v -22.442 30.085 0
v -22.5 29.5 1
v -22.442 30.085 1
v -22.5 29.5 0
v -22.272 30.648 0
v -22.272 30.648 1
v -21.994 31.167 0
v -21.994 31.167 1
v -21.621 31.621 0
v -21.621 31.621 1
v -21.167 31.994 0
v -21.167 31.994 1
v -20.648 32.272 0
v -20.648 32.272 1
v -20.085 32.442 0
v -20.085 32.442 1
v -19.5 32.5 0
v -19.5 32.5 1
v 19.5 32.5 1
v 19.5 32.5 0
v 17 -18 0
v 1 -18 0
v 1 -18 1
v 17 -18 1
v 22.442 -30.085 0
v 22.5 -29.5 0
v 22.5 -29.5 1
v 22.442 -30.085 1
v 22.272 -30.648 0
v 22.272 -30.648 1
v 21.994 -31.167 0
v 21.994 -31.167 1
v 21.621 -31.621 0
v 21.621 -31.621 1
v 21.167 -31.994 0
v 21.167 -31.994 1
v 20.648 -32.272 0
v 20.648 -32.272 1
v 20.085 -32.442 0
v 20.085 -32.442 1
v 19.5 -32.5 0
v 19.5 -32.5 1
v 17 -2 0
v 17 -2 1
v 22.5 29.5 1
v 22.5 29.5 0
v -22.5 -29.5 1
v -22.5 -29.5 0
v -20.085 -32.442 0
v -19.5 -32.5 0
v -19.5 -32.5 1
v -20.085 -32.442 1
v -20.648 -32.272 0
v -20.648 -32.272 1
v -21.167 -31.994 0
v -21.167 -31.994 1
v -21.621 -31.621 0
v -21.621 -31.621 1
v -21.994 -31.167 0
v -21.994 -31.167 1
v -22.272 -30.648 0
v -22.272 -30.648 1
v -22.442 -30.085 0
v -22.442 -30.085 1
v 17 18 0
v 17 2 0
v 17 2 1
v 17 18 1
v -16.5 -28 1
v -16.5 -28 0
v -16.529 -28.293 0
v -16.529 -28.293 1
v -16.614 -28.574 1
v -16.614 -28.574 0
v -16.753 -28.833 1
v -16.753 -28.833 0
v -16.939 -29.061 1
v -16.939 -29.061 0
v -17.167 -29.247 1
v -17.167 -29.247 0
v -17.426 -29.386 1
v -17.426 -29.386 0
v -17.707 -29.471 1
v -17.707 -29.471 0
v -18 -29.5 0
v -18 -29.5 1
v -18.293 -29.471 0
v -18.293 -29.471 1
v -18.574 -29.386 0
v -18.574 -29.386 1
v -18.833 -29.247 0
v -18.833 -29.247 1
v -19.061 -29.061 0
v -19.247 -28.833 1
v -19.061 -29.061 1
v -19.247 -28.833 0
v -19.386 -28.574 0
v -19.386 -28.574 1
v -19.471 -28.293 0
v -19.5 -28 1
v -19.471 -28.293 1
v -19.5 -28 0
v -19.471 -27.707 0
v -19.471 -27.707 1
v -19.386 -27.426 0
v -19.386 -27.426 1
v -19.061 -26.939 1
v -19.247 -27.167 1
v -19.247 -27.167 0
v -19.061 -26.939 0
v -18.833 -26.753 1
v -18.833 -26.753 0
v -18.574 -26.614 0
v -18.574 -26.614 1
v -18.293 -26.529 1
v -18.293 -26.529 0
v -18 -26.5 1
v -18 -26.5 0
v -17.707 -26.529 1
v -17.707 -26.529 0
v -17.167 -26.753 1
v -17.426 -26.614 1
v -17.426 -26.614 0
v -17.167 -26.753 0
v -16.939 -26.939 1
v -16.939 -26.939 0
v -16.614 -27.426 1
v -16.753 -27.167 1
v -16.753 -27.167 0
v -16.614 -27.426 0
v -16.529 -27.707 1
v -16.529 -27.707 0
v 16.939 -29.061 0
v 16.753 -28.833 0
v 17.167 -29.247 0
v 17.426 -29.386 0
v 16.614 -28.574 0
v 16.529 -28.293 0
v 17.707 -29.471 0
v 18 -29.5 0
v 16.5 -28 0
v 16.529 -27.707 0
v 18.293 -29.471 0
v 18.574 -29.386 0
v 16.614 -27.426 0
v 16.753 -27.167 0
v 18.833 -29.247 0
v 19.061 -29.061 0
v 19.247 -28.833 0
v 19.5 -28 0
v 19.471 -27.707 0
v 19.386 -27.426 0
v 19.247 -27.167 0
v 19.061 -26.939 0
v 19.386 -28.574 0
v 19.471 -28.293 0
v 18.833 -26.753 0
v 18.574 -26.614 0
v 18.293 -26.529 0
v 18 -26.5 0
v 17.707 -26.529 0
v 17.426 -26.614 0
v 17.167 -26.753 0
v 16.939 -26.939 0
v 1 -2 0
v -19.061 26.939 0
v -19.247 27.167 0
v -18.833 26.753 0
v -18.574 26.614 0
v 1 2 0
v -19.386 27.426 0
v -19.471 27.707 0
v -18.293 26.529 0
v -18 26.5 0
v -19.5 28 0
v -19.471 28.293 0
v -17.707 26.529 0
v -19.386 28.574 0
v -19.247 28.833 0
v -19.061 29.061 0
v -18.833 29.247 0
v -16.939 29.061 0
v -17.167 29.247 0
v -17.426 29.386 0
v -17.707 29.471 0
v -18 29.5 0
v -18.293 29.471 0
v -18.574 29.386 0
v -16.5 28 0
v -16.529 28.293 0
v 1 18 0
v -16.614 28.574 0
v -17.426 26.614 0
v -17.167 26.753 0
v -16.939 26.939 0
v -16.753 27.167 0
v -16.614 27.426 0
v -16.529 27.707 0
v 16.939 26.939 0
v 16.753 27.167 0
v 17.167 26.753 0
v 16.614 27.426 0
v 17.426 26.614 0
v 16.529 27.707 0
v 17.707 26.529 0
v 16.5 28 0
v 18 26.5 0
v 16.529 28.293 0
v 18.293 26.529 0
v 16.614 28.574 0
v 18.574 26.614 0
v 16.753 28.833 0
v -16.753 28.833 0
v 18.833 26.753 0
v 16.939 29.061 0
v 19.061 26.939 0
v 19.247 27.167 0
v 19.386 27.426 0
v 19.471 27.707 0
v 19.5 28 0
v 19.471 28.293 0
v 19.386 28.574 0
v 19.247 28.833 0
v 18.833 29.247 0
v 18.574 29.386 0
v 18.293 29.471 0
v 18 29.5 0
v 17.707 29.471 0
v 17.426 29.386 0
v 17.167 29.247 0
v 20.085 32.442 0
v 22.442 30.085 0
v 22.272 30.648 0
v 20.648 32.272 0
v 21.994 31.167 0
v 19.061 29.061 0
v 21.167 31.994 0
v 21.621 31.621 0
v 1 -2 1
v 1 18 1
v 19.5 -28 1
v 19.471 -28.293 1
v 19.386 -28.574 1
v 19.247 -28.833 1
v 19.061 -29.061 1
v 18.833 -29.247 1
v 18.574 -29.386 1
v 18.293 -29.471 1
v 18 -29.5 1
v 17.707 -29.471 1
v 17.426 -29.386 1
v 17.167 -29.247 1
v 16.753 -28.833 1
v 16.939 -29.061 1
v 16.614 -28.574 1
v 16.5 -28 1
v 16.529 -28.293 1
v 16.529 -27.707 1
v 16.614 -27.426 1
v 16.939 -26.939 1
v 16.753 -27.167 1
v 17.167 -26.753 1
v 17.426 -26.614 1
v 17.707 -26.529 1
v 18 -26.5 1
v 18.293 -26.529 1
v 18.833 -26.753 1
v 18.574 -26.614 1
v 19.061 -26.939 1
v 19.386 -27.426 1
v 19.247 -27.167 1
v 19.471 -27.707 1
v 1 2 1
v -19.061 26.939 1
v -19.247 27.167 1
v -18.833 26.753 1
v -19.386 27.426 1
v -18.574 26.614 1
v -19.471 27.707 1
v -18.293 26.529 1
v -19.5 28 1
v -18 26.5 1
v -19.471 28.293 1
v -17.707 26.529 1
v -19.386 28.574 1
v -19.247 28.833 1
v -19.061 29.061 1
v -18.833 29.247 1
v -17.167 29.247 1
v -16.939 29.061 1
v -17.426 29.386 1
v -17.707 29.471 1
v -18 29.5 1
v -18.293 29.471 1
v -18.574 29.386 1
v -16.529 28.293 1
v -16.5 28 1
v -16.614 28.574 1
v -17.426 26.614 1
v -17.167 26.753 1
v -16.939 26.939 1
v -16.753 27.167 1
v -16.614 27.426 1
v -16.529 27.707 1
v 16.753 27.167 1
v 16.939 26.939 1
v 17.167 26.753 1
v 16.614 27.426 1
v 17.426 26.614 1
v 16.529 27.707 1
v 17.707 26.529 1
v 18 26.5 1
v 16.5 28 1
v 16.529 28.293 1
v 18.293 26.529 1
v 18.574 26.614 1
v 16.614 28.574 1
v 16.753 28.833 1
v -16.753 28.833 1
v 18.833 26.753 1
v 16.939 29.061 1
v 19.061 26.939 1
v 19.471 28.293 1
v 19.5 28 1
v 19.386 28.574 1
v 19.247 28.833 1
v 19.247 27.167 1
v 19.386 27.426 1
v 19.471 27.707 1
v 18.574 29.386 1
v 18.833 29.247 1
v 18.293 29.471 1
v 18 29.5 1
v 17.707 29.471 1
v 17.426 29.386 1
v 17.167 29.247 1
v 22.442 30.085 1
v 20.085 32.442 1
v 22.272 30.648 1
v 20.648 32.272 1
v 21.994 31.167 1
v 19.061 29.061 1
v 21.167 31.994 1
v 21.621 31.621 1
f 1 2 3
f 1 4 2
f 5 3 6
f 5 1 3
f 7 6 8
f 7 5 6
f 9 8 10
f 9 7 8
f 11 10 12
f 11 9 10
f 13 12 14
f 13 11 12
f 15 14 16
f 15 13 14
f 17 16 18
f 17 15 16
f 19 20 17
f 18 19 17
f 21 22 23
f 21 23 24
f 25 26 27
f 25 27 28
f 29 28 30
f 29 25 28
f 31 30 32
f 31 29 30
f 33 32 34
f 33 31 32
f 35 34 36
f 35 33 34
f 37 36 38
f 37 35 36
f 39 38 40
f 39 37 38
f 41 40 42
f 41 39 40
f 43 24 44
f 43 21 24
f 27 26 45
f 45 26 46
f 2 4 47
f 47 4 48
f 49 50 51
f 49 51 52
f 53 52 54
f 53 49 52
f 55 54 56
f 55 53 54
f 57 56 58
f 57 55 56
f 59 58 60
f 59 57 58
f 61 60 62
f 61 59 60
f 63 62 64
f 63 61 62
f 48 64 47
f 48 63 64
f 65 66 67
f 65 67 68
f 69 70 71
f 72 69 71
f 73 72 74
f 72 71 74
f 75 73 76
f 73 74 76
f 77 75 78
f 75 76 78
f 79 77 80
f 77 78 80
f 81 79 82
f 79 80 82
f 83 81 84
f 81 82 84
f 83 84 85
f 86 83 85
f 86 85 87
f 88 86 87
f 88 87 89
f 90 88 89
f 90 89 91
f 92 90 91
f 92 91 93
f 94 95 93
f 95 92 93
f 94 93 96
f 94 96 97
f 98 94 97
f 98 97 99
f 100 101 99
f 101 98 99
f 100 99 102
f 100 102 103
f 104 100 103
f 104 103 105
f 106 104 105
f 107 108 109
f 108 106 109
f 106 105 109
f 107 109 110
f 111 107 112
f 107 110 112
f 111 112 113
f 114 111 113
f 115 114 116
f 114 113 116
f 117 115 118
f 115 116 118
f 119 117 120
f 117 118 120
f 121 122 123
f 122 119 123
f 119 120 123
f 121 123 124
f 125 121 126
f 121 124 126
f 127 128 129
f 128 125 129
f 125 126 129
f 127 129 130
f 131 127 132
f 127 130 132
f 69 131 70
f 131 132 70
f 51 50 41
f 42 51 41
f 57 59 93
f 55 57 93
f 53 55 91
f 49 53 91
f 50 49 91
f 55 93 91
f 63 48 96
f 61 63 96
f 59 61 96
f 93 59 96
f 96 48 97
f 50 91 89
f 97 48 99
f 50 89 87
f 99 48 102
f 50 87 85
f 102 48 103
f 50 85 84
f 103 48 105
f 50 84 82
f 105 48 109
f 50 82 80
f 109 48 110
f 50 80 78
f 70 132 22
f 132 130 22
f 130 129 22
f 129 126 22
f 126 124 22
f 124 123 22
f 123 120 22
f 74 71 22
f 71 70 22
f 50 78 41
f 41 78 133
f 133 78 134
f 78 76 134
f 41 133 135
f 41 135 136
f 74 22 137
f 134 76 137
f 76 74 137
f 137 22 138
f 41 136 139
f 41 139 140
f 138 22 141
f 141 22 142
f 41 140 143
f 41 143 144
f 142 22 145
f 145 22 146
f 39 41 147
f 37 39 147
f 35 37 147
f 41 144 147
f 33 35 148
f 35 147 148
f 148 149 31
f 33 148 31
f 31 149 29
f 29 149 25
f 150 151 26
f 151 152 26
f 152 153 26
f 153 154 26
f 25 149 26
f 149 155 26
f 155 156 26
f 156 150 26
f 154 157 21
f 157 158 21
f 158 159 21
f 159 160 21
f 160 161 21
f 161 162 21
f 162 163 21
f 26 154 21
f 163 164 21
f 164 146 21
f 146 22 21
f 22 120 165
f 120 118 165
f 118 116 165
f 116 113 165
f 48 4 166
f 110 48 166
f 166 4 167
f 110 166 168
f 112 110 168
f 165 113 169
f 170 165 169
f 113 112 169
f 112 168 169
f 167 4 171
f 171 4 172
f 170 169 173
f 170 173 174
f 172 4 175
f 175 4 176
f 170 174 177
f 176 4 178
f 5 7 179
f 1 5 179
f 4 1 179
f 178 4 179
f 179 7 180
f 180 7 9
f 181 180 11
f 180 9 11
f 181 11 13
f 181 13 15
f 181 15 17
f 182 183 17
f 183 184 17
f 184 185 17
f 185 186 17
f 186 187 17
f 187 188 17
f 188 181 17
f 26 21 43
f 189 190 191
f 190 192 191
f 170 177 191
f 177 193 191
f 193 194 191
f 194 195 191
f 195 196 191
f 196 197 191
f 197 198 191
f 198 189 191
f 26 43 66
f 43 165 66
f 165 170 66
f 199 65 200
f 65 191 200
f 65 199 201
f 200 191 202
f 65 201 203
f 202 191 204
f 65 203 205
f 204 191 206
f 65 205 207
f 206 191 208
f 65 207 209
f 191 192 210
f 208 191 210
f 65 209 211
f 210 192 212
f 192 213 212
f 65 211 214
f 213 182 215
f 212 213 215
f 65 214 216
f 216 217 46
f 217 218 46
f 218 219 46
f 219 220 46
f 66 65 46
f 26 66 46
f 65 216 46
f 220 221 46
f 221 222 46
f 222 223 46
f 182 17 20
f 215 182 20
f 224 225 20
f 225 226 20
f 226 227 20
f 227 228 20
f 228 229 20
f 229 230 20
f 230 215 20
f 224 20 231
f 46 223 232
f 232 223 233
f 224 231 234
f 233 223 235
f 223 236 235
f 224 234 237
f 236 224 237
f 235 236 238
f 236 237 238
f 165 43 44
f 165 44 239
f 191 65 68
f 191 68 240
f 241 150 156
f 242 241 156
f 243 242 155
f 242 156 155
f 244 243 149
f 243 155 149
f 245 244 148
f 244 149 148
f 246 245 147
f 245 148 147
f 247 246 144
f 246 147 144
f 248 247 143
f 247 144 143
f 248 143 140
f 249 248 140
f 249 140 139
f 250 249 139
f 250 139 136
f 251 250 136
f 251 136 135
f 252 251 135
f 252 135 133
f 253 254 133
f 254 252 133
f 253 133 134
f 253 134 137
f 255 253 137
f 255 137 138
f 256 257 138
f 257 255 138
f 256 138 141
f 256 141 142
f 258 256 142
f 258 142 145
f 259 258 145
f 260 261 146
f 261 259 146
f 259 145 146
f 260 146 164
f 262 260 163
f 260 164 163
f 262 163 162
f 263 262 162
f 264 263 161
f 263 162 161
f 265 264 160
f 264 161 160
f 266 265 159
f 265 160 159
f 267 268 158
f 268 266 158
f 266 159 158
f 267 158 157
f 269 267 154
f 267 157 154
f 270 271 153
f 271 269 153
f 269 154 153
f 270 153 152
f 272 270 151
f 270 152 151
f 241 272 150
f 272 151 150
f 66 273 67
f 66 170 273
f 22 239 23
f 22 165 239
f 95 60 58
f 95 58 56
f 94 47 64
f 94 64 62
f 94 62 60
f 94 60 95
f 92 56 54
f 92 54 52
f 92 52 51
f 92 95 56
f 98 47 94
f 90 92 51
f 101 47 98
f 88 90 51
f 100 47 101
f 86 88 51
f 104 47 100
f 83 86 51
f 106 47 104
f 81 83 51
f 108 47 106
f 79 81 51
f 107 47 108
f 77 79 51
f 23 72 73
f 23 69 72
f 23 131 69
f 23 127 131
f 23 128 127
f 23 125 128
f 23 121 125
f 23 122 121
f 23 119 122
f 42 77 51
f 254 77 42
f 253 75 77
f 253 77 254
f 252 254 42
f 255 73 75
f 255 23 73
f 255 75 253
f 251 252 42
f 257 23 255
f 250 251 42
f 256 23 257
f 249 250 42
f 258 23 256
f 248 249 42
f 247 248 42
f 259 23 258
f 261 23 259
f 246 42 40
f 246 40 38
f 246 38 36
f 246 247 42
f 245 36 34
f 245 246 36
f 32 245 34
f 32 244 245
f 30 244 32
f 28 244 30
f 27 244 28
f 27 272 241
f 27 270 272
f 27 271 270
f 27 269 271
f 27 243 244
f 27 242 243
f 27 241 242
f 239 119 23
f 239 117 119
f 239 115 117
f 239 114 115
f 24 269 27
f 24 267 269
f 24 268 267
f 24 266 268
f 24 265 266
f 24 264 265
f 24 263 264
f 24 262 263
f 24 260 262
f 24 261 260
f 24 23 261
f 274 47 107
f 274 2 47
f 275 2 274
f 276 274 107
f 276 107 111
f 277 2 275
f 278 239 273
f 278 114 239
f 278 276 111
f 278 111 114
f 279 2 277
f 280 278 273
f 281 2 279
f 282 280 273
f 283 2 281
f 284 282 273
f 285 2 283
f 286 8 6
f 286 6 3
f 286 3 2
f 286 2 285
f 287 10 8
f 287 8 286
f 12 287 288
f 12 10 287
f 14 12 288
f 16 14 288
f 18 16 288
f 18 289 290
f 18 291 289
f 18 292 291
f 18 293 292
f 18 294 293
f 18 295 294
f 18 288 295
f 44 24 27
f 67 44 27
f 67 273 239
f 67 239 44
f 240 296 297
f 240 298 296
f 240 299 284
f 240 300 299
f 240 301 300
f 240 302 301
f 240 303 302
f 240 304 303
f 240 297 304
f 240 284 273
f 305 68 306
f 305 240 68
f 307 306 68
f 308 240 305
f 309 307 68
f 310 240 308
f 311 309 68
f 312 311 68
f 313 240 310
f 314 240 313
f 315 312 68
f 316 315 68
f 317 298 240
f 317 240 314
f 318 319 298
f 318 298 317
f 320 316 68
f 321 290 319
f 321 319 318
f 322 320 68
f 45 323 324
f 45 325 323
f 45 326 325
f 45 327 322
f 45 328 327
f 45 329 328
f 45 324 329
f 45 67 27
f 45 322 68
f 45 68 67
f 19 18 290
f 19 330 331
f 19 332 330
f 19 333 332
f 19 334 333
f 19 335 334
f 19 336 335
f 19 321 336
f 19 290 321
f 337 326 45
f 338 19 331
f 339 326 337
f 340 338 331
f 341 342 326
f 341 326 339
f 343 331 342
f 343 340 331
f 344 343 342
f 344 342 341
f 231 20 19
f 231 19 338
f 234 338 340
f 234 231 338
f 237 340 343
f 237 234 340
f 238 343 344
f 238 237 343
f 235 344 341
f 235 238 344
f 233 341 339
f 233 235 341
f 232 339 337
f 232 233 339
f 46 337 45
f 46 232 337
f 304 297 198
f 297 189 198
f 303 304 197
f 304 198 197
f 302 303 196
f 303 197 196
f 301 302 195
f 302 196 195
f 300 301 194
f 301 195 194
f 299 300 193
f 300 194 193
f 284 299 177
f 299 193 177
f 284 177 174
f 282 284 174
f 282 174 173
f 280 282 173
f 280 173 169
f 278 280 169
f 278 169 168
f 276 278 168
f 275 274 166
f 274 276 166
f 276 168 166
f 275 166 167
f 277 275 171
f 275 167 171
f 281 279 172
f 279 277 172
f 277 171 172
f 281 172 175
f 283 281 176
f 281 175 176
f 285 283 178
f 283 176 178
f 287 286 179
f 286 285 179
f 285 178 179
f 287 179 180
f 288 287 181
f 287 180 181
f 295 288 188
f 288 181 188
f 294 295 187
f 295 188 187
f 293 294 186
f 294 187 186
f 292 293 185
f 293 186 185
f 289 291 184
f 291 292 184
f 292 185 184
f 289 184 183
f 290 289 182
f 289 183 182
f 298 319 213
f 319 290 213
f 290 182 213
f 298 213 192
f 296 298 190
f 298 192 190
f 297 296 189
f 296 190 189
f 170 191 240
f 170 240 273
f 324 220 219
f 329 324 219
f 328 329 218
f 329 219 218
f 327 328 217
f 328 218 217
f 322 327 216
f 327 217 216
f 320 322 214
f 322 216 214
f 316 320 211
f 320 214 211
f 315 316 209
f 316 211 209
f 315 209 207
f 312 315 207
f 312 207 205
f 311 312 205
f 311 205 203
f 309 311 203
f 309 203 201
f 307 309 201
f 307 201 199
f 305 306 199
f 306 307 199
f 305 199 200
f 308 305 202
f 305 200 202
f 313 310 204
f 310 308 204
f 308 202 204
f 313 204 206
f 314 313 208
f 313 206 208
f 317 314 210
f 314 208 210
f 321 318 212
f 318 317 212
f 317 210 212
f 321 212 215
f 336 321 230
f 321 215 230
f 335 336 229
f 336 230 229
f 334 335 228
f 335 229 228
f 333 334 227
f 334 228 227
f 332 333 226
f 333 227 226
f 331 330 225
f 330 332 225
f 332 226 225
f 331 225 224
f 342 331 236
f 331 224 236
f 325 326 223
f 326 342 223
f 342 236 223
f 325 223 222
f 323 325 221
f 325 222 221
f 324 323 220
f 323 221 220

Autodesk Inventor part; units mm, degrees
ref_plane "YZ Plane" through (0, 0, 0) normal (1, 0, 0) x (0, 1, 0)
ref_plane "XZ Plane" through (0, 0, 0) normal (0, 1, 0) x (-1, 0, 0)
ref_plane "XY Plane" through (0, 0, 0) normal (0, 0, 1) x (1, 0, 0)
sketch "Эскиз1" plane through (0, 0, 0) normal (0, 0, 1) x (1, 0, 0)
  line L0 (1, 18) -> (1, 2) projected
  line L1 (1, 2) -> (17, 2) projected
  line L2 (17, 2) -> (17, 18) projected
  line L3 (17, 18) -> (1, 18) projected
  line L4 (1, -2) -> (1, -18) projected
  line L5 (1, -18) -> (17, -18) projected
  line L6 (17, -18) -> (17, -2) projected
  line L7 (17, -2) -> (1, -2) projected
  line L8 (-22.5, -9) -> (-22.5, -29.5) projected
  arc A0 (-22.5, -29.5) -> (-19.5, -32.5) centre (-19.5, -29.5) ccw projected
  line L9 (-19.5, -32.5) -> (19.5, -32.5) projected
  arc A1 (19.5, -32.5) -> (22.5, -29.5) centre (19.5, -29.5) ccw projected
  line L10 (22.5, -29.5) -> (22.5, 29.5) projected
  arc A2 (22.5, 29.5) -> (19.5, 32.5) centre (19.5, 29.5) ccw projected
  line L11 (19.5, 32.5) -> (-19.5, 32.5) projected
  arc A3 (-19.5, 32.5) -> (-22.5, 29.5) centre (-19.5, 29.5) ccw projected
  line L12 (-22.5, 29.5) -> (-22.5, 9) projected
  line L13 (-22.5, 9) -> (-2, 9) projected
  line L14 (-2, 9) -> (-2, -9) projected
  line L15 (-2, -9) -> (-22.5, -9) projected
  line L16 (1, 18) -> (17, 18) projected
  line L17 (17, 18) -> (17, 2) projected
  line L18 (17, 2) -> (1, 2) projected
  line L19 (1, 2) -> (1, 18) projected
  line L20 (1, -2) -> (17, -2) projected
  line L21 (17, -2) -> (17, -18) projected
  line L22 (17, -18) -> (1, -18) projected
  line L23 (1, -18) -> (1, -2) projected
  circle A4 centre (-18, 28) radius 1.5 projected
  circle A5 centre (18, 28) radius 1.5 projected
  circle A6 centre (18, -28) radius 1.5 projected
  circle A7 centre (-18, -28) radius 1.5 projected
  line L24 (-22.5, 9) -> (-22.5, -9)
  point P0 (0, 0)
extrude "Выдавливание1" add sketch "Эскиз1" along normal blind 1
properties part number "level3_up"
